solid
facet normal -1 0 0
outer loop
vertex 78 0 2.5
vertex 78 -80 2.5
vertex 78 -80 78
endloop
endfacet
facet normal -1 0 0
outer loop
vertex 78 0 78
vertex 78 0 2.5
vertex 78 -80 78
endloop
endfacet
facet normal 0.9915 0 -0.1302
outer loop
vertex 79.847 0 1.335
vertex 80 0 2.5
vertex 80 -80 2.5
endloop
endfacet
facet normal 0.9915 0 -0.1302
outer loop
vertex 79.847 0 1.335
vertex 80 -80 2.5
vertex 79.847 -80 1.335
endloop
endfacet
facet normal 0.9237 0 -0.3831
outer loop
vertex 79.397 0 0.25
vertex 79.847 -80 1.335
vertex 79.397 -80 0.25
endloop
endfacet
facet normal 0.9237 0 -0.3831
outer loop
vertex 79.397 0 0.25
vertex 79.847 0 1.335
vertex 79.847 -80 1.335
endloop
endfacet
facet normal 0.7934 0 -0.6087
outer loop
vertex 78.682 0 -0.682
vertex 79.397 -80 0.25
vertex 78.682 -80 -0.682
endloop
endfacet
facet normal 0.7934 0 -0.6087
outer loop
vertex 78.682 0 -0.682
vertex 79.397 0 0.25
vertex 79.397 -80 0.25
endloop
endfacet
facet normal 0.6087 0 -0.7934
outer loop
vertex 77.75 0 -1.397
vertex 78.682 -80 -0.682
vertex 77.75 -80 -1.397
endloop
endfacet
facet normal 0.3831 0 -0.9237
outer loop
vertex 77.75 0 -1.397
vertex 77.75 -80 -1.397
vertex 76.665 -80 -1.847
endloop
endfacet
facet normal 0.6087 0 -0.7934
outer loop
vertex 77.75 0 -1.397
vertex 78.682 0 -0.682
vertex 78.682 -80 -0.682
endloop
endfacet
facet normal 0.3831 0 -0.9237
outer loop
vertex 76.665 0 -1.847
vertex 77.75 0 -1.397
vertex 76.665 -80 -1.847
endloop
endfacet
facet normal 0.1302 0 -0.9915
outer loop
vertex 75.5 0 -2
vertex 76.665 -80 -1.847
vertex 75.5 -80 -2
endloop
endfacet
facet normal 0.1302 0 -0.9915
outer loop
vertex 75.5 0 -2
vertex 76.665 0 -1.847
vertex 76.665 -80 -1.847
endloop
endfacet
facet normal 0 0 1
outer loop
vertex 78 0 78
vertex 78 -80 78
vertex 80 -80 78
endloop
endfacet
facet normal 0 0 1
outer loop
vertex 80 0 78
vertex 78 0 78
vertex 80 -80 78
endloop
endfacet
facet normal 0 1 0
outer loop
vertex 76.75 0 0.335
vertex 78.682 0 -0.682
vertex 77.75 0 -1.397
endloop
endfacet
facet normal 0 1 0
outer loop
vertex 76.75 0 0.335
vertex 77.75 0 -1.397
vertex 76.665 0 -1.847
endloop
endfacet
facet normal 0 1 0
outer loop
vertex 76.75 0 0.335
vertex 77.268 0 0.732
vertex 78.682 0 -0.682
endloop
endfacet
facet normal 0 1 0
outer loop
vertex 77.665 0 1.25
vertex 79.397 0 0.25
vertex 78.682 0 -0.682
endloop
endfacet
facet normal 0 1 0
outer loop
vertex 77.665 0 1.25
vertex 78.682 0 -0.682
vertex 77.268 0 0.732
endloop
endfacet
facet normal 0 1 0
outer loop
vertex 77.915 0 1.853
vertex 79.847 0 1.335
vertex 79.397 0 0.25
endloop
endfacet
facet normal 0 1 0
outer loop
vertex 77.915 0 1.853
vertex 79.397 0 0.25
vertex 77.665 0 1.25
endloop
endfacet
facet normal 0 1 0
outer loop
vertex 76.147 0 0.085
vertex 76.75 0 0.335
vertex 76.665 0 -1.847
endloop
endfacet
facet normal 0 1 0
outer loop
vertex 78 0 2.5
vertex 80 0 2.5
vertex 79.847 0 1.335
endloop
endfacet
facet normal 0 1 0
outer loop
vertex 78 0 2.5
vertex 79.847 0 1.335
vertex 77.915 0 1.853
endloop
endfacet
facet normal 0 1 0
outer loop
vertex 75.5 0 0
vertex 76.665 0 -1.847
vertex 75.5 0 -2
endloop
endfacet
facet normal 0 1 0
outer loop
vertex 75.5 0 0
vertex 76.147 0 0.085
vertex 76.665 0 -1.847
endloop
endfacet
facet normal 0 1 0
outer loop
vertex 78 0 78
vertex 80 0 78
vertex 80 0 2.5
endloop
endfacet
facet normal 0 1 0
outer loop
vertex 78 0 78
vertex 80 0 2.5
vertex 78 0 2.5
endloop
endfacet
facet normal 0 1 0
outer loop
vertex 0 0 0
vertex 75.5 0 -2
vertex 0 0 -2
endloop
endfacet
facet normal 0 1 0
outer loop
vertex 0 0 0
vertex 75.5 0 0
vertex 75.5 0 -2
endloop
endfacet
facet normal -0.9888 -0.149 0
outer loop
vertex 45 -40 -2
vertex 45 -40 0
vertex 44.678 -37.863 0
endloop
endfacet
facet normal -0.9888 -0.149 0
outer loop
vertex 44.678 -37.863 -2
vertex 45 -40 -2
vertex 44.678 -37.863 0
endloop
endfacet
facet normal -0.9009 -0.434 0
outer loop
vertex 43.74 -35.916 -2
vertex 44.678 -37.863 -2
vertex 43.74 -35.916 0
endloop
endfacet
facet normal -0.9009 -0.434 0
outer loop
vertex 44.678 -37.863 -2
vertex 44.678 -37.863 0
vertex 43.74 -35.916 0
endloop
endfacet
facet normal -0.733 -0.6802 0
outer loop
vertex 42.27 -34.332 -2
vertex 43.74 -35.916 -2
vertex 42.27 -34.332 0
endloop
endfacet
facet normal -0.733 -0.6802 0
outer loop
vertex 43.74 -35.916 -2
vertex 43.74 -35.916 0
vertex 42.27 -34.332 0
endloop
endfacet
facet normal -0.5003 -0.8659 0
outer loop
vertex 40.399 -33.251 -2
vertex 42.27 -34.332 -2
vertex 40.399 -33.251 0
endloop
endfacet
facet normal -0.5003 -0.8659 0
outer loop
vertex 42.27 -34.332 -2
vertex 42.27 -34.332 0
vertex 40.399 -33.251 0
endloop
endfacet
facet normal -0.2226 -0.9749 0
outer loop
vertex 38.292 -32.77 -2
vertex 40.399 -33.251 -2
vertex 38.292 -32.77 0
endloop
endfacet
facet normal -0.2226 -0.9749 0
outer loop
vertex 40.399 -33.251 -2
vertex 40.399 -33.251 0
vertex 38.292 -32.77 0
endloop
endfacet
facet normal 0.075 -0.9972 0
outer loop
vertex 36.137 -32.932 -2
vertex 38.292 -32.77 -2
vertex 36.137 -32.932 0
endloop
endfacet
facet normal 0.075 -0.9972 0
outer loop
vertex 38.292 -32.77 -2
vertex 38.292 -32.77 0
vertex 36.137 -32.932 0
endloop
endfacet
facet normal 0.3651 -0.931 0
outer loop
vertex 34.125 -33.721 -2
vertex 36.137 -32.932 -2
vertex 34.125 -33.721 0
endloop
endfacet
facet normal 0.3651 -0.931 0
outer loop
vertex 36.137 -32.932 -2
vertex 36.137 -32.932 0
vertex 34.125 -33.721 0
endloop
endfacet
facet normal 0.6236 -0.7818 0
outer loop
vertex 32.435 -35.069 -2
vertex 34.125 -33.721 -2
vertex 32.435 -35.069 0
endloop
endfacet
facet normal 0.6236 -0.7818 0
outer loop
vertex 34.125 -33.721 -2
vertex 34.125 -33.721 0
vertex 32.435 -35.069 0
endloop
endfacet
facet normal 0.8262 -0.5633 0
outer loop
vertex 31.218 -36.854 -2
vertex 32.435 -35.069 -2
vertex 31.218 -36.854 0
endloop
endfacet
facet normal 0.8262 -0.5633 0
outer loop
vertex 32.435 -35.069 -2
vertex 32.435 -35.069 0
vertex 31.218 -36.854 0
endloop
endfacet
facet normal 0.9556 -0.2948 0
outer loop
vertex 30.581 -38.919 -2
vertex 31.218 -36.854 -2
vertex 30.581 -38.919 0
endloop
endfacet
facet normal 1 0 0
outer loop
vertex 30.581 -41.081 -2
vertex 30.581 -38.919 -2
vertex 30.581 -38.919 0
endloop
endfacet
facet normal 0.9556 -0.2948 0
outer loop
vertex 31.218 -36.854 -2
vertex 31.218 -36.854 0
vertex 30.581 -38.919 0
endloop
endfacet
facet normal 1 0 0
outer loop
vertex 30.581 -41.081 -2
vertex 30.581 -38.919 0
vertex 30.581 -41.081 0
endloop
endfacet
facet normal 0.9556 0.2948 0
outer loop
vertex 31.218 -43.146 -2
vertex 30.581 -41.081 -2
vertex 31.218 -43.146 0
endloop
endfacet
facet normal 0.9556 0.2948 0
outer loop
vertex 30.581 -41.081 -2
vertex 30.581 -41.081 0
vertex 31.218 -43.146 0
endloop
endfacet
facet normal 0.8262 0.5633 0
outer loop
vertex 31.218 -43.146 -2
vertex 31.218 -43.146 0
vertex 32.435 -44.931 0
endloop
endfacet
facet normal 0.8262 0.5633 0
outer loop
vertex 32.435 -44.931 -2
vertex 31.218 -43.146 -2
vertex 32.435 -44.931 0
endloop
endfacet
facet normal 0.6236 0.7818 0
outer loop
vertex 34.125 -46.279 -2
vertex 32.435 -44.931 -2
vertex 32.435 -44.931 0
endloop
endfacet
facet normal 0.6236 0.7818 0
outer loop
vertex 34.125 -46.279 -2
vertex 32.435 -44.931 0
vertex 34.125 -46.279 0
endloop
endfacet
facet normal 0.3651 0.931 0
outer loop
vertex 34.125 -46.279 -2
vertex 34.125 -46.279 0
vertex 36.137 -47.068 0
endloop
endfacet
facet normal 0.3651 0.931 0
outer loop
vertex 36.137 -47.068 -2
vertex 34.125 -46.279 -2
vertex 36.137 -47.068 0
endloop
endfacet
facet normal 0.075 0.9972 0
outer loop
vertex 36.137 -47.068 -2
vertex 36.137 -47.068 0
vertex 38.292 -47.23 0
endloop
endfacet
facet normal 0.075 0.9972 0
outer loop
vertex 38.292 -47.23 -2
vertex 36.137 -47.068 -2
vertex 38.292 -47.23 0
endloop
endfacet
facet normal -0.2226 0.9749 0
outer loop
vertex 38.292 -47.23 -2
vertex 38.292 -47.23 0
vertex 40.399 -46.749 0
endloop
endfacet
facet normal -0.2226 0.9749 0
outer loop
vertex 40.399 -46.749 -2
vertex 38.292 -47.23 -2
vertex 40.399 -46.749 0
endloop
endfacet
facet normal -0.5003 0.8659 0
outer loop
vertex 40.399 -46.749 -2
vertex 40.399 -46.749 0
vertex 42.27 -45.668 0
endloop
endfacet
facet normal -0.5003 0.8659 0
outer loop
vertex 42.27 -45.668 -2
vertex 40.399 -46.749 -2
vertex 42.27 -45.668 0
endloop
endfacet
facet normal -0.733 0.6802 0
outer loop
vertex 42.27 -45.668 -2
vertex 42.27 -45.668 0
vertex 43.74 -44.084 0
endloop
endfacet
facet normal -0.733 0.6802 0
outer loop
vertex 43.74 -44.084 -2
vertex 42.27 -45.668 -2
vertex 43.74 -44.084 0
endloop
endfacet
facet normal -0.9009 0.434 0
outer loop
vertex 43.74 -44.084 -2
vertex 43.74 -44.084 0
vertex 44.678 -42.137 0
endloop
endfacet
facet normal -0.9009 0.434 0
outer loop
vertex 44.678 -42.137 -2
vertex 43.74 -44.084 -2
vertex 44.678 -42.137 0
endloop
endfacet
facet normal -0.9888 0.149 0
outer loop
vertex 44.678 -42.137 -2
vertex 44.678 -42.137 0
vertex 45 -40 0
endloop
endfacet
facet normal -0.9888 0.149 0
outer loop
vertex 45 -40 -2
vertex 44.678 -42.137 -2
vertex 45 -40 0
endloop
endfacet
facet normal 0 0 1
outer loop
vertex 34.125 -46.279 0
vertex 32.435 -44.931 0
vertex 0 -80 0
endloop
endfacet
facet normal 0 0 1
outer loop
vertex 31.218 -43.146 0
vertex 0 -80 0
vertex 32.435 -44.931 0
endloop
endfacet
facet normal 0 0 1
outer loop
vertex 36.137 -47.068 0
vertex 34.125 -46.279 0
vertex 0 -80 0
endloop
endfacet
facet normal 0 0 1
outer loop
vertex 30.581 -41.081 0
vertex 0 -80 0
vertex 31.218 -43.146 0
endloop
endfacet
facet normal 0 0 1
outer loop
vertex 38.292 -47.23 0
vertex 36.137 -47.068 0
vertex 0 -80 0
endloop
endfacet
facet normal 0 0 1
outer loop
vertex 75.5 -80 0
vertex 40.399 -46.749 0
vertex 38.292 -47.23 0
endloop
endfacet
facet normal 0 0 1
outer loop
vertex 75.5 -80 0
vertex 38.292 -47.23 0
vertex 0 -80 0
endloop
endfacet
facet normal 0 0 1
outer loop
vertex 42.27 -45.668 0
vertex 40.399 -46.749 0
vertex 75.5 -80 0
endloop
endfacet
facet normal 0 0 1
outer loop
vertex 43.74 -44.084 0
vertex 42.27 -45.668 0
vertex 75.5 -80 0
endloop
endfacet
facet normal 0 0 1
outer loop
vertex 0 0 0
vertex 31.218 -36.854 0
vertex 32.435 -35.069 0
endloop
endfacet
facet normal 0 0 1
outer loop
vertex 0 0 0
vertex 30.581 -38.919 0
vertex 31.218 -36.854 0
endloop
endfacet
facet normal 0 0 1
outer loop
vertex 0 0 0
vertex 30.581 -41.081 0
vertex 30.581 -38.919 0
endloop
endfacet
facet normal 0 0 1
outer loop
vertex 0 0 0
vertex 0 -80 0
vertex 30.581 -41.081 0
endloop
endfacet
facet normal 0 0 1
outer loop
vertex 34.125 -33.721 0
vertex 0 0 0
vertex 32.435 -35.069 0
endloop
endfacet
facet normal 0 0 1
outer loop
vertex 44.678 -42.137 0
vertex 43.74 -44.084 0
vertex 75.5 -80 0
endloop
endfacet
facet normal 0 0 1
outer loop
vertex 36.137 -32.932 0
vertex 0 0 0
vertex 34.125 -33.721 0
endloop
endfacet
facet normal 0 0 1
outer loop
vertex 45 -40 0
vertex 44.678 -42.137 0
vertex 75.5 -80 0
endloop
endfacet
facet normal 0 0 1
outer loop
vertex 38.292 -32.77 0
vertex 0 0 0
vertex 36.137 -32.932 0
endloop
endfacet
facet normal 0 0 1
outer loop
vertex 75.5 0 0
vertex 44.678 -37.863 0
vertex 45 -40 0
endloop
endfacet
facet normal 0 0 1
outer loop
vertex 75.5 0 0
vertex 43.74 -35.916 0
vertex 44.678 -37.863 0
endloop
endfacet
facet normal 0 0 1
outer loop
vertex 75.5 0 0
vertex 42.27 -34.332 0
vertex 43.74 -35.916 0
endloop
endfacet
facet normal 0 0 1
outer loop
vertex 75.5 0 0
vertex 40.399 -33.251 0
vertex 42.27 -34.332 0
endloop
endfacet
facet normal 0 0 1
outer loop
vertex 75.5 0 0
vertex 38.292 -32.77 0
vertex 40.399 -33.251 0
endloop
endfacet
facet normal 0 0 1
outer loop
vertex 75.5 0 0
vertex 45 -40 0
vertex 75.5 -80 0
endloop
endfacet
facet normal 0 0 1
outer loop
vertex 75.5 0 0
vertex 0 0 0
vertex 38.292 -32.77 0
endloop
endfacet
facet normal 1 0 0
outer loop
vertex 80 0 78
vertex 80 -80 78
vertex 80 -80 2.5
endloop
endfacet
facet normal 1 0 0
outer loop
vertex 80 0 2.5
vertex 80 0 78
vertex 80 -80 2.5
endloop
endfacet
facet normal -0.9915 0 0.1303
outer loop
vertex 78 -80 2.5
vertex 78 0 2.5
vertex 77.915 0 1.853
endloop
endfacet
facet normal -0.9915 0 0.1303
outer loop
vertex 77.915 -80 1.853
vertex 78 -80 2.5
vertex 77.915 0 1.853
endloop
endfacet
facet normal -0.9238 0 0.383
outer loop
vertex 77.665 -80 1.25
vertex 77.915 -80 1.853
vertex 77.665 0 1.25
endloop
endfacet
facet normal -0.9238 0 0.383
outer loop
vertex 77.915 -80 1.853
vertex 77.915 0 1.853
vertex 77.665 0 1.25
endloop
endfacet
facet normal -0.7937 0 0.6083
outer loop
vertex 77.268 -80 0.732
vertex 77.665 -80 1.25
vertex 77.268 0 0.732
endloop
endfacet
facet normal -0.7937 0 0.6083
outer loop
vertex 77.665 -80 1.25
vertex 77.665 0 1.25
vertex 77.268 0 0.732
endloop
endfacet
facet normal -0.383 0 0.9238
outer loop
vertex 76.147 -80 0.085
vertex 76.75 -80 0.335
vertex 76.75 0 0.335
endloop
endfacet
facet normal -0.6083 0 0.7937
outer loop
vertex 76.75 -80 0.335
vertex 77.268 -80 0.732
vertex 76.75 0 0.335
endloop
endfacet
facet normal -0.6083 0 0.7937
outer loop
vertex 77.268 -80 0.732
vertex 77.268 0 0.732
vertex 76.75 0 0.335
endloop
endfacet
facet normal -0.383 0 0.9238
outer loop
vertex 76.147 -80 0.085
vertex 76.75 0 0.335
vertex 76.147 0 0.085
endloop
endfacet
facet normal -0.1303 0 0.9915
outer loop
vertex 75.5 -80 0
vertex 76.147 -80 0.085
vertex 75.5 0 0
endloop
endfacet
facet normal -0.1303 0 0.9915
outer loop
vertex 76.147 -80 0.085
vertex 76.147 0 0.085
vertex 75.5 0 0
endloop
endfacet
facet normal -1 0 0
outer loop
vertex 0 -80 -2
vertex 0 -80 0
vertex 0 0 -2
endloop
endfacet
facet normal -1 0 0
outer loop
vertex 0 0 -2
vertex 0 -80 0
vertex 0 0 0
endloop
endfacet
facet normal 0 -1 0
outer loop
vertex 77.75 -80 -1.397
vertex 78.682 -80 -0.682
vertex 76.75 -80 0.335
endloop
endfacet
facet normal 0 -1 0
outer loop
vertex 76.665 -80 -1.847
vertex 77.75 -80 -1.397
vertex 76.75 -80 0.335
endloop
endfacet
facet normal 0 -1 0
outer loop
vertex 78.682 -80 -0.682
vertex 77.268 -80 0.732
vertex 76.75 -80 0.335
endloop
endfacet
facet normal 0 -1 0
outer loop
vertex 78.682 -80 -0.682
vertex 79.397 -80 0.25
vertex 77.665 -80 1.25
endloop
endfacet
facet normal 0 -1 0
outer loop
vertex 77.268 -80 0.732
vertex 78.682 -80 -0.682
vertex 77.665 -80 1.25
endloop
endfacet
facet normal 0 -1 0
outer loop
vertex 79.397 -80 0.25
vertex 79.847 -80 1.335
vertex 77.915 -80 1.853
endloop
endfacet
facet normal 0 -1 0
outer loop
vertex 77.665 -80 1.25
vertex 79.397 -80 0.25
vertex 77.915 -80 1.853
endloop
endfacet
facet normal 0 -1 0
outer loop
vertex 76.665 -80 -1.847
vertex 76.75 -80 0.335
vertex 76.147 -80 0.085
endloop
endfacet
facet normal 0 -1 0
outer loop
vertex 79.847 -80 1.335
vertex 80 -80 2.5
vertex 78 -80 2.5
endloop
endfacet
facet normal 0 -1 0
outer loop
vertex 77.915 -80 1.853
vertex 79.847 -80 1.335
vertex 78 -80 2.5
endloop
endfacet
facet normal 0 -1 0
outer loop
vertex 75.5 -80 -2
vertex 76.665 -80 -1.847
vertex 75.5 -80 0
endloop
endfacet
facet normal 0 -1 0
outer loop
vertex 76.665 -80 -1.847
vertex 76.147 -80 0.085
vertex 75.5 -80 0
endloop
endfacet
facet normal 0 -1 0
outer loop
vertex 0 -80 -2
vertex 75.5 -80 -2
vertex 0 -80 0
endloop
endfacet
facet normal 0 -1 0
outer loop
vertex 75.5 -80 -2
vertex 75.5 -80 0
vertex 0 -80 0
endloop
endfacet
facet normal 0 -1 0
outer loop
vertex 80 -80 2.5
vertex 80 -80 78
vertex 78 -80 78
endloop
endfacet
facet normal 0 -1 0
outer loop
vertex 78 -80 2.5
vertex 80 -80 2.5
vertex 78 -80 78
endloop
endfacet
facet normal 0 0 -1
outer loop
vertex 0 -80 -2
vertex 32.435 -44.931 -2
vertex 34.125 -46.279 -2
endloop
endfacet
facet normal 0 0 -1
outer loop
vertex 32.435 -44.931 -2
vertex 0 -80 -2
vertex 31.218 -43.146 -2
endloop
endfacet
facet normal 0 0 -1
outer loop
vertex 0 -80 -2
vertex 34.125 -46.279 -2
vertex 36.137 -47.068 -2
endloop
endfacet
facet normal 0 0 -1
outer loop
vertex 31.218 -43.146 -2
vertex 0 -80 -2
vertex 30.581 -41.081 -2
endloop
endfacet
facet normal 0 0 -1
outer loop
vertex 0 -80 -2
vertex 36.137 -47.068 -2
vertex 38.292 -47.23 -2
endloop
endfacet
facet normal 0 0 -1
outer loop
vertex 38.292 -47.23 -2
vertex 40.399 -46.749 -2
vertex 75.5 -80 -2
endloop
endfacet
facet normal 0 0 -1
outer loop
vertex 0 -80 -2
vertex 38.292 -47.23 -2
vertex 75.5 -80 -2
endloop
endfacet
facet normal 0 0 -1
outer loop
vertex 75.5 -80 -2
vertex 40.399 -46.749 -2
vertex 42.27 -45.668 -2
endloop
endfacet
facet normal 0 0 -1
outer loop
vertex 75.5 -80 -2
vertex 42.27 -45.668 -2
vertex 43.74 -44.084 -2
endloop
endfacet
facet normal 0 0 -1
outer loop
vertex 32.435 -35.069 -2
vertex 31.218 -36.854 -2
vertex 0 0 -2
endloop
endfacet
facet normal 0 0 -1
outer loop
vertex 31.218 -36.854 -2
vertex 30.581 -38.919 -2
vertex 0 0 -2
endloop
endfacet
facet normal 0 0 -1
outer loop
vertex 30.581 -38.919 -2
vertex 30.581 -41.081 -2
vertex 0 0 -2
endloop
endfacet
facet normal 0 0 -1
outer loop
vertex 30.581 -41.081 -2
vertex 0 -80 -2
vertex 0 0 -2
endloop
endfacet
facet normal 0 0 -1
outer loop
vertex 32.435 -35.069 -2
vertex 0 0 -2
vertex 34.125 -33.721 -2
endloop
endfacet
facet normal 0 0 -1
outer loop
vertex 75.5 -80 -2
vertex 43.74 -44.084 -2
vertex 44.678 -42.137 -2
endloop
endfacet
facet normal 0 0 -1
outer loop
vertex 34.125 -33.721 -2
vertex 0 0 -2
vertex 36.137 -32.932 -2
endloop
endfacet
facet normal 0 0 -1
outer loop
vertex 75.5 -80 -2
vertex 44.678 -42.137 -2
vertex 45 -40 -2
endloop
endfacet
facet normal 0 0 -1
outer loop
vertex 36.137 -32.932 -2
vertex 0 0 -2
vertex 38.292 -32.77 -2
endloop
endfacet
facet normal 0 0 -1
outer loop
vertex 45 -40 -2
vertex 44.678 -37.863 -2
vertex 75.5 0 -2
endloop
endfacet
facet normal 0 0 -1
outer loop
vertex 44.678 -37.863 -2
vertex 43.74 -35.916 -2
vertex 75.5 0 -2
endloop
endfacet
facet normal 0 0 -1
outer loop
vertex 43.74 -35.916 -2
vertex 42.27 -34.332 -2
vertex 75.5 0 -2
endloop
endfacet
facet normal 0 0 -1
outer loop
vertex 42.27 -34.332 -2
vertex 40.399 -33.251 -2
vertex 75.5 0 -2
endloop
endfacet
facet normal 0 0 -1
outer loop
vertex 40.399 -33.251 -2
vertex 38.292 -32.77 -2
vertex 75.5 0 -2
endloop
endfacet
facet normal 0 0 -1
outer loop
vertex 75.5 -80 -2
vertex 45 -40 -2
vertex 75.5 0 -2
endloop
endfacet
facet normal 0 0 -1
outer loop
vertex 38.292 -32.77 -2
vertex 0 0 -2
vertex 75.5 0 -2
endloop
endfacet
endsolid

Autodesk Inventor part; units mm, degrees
ref_plane "YZ Plane" through (0, 0, 0) normal (1, 0, 0) x (0, 1, 0)
ref_plane "XZ Plane" through (0, 0, 0) normal (0, 1, 0) x (-1, 0, 0)
ref_plane "XY Plane" through (0, 0, 0) normal (0, 0, 1) x (1, 0, 0)
sketch "Sketch1" plane through (0, 0, 0) normal (0, 0, 1) x (1, 0, 0)
  line L0 (0, 0) -> (80, 0)
  line L1 (80, 0) -> (80, -80)
  line L2 (80, -80) -> (0, -80)
  line L3 (0, -80) -> (0, 0)
  dimension "d0" = 80
  dimension "d1" = 80
extrude "Plate1" add sketch "Sketch1" against normal blind 2
sketch "Sketch2" plane through (78, 0, -2) normal (1, 0, 0) x (0, 1, 0)
  line L0 (-80, 0) -> (0, 0)
  line L1 (0, 0) -> (0, 80)
  line L2 (0, 80) -> (-80, 80)
  line L3 (-80, 80) -> (-80, 0)
edge flange "Flange1" height 80 angle 90 thickness 2 bend radius 2.5 thickness toward (1, 0, 0) relief round relief width 2 relief depth 1 edges at (80, -40, 0) wall of the first edge with corners at (78, -80, -2) (78, 0, -2) (78, 0, 78) (78, -80, 78)
bend "Bend1"
corner "Corner1"
sketch "Sketch3" plane through (0, 0, 0) normal (0, 0, 1) x (1, 0, 0)
  line L0 (75.5, 0) -> (0, 0) projected
  line L1 (75.5, -80) -> (75.5, 0) projected
  line L2 (0, 0) -> (75.5, -80) construction
  circle A0 centre (37.75, -40) radius 7.25
  dimension "d13" = 14.5
extrude "Extrusion1" cut sketch "Sketch3" against normal through all
equation "\"d2\" = Thickness"
equation "\"d3\" = BendReliefWidth"
equation "\"d4\" = BendReliefDepth"
equation "\"d5\" = MinimumRemnant"
equation "\"d6\" = TransitionRadius"
equation "\"d9\" = BendRadius"
equation "\"d10\" = CornerReliefSize"
equation "\"d11\" = GapSize"
equation "\"d12\" = JacobiRadiusSize"
equation "\"BendReliefWidth\" = Thickness"
equation "\"BendReliefDepth\" = 0.5 * Thickness"
equation "\"CornerReliefSize\" = 4 * Thickness"
equation "\"MinimumRemnant\" = 2 * Thickness"
equation "\"TransitionRadius\" = BendRadius"
equation "\"JacobiRadiusSize\" = BendRadius"
equation "\"GapSize\" = Thickness"
equation "\"Thickness\" = 2"
equation "\"BendRadius\" = 2.5"
properties part number "ASY MSC Мостики уголок" material "Stainless Steel"
